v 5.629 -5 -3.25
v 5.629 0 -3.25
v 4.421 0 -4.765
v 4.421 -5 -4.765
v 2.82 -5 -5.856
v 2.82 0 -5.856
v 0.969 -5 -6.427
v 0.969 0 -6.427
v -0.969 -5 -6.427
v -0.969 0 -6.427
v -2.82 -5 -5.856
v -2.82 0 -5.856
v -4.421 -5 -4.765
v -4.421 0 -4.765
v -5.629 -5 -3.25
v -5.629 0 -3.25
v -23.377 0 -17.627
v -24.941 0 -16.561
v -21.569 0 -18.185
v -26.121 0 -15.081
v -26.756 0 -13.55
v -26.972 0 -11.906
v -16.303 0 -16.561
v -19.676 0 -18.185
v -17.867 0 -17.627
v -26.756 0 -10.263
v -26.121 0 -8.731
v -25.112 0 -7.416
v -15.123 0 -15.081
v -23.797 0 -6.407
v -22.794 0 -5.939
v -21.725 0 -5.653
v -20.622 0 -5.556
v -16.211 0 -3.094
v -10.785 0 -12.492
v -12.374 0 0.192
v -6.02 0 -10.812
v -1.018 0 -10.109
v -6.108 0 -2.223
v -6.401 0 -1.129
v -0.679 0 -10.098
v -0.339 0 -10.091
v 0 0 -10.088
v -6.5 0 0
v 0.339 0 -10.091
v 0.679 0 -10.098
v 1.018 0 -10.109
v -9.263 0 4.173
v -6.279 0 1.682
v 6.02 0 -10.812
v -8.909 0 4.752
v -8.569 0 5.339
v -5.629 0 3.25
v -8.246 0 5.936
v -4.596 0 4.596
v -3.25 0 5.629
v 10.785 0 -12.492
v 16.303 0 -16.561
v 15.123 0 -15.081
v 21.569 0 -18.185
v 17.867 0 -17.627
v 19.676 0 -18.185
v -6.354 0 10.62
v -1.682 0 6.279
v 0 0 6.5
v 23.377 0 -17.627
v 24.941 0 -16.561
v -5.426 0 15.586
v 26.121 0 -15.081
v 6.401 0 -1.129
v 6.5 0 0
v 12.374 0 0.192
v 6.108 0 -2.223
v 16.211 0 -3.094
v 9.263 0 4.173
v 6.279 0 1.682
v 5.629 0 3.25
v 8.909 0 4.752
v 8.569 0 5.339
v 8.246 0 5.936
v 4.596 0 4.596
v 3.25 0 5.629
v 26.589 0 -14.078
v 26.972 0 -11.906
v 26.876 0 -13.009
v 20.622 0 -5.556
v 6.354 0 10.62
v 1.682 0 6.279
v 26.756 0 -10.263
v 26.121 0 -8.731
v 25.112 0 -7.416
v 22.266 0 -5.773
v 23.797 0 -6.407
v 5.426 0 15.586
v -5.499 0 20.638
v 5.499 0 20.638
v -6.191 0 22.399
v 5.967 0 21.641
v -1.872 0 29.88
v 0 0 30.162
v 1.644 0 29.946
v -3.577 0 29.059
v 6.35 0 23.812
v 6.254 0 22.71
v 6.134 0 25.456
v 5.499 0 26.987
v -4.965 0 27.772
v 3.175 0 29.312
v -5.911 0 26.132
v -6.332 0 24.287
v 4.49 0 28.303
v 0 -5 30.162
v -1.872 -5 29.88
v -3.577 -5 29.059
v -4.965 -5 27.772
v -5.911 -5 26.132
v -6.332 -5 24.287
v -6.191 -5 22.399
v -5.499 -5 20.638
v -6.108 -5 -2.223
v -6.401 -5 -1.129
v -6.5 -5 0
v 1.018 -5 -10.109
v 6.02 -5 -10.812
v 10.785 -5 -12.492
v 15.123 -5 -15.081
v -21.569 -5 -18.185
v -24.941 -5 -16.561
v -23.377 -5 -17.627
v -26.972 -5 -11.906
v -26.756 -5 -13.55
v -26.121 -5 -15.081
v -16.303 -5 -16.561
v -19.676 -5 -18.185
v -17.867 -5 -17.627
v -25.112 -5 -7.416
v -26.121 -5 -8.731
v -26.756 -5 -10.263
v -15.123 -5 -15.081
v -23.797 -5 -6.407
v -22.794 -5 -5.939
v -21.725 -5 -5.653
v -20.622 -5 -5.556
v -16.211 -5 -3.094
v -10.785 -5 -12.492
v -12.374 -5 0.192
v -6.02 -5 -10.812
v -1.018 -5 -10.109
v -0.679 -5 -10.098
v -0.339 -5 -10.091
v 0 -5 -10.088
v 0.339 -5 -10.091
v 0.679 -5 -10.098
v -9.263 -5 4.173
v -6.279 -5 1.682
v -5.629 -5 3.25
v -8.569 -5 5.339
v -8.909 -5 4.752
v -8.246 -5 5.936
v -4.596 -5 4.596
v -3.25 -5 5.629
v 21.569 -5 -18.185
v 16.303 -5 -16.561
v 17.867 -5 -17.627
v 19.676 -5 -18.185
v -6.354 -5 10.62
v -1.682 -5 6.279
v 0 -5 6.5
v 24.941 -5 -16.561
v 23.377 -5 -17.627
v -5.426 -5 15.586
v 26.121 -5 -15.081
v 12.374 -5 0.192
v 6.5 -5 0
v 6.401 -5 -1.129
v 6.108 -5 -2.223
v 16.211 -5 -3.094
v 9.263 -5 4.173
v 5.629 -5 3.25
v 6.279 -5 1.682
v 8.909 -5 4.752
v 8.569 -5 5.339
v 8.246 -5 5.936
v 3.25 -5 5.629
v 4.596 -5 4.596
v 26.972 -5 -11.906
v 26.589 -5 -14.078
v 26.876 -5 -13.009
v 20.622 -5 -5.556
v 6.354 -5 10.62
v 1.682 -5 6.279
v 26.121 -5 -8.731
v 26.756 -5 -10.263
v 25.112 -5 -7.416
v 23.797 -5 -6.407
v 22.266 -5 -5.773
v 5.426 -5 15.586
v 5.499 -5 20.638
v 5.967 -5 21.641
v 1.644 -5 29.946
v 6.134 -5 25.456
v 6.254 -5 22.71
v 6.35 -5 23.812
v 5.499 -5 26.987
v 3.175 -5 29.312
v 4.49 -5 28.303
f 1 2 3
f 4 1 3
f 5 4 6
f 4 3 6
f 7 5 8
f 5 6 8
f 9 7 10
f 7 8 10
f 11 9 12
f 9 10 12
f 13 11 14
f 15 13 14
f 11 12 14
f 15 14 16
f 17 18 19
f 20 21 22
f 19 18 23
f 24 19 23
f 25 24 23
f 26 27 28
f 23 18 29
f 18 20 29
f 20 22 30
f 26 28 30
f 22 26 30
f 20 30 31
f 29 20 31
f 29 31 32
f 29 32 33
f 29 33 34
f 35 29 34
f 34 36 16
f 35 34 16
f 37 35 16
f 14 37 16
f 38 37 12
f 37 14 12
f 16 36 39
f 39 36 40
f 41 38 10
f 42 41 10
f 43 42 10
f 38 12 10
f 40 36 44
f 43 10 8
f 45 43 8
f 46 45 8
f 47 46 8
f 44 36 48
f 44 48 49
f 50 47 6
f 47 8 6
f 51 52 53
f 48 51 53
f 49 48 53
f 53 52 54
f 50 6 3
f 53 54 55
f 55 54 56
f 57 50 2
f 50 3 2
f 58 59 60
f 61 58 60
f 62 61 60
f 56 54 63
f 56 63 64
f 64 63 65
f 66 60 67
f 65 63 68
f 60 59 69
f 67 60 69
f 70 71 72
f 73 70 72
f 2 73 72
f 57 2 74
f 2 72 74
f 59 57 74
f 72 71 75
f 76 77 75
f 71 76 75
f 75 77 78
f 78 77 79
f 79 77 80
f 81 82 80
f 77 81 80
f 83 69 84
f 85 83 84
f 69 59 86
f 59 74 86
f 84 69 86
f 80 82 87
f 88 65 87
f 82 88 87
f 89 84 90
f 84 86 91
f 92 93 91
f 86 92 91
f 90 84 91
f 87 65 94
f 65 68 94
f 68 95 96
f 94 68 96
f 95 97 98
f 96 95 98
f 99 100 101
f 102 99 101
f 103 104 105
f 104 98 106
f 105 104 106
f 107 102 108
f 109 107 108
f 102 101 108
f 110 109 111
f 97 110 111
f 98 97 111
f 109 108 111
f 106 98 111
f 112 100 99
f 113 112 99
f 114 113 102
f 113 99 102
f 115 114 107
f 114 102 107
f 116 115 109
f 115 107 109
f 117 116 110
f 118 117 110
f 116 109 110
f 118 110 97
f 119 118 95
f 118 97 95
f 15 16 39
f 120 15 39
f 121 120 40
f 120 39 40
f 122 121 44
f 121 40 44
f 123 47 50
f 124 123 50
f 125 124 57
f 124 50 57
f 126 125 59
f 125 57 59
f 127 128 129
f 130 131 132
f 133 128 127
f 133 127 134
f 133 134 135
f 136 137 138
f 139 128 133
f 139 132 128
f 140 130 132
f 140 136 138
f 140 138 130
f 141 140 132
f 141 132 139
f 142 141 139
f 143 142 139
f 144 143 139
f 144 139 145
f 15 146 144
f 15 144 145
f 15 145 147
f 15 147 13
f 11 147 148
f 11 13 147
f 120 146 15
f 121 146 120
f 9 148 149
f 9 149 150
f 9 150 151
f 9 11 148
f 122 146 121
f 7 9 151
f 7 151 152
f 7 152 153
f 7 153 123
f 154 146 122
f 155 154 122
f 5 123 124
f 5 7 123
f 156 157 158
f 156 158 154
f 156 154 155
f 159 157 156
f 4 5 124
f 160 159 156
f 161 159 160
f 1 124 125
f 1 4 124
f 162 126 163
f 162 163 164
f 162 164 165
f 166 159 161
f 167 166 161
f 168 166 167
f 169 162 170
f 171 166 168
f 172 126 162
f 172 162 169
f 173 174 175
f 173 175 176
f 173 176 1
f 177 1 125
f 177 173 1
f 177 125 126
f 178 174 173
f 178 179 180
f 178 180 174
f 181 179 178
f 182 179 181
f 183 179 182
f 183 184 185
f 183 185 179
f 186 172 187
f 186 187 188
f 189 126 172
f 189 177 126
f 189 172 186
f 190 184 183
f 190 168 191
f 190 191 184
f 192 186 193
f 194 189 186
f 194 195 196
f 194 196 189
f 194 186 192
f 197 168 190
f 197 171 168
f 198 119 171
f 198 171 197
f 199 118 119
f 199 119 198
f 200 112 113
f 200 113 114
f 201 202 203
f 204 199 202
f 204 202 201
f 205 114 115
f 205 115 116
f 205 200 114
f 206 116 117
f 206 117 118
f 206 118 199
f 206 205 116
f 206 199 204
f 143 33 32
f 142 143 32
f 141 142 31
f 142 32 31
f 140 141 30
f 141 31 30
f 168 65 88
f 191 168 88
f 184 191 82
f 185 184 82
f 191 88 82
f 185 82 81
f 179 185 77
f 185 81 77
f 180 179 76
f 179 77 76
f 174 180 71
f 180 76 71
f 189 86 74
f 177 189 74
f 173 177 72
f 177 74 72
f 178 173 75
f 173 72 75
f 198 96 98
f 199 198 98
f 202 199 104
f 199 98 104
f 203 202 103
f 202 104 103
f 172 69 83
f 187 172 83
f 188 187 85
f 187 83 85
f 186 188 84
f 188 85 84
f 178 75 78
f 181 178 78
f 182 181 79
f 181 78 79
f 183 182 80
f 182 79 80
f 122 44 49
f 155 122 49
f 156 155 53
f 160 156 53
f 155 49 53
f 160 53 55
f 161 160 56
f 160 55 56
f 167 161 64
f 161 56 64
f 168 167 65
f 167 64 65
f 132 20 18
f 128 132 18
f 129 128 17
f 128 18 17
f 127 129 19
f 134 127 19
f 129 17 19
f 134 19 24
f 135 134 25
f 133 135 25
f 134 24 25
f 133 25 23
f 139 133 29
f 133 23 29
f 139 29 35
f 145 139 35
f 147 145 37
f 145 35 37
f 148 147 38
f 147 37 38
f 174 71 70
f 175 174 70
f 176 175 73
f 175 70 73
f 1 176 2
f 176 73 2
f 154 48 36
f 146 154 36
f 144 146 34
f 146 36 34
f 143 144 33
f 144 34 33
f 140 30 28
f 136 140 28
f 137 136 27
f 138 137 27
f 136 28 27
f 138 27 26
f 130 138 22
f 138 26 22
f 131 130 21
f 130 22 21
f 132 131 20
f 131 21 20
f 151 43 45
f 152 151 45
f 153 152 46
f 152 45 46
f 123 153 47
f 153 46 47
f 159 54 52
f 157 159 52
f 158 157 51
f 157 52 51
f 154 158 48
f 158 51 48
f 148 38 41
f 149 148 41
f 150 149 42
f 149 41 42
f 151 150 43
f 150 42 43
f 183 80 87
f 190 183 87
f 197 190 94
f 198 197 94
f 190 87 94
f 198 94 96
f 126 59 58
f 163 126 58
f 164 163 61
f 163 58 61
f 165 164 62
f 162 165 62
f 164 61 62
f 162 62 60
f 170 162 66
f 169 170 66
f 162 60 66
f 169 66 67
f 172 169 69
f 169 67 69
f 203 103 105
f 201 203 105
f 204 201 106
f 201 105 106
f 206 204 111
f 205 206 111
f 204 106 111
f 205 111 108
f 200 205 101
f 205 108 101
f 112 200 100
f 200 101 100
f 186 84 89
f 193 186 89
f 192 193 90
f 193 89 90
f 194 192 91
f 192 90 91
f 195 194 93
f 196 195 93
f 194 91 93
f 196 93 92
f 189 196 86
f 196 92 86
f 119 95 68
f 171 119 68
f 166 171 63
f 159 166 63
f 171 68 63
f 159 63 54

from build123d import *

# Parameters (mm, degrees)
F1_DEPTH = 5


# Not quite as in the source:
# - a feature names something its author has since deleted; it is built from what else it names


with BuildPart() as f1:
    # F0 (on Front) → F1 (new body)
    with BuildSketch(Plane.XZ):
        with BuildLine():
            ThreePointArc((-6.5, 0), (-4.5961940777, 4.5961940777), (0, 6.5))
            Line((0, 6.5), (0, 10.16))
            ThreePointArc((0, 10.16), (-4.6323577324, 9.0425030738), (-8.2456907547, 5.9358389447))
            ThreePointArc((-8.2456907547, 5.9358389447), (-8.7368966018, 5.0442496049), (-9.2634326962, 4.173058193))
            ThreePointArc((-9.2634326962, 4.173058193), (-9.9333296581, 2.1341419594), (-10.16, 0))
            Line((-10.16, 0), (-6.5, 0))
        make_face()
        with BuildLine():
            ThreePointArc((-5.6291651246, -3.25), (-6.2785178709, -1.6823237932), (-6.5, 0))
            Line((-6.5, 0), (-10.16, 0))
            ThreePointArc((-10.16, 0), (-9.8138063951, -2.6296014982), (-8.7988181024, -5.08))
            Line((-8.7988181024, -5.08), (-5.6291651246, -3.25))
        make_face()
        with BuildLine():
            ThreePointArc((-1.0177419415, -10.1088971377), (-0.508973166, -10.0935992038), (0, -10.0884992098))
            Line((0, -10.0884992098), (0, -6.5))
            ThreePointArc((0, -6.5), (-3.25, -5.6291651246), (-5.6291651246, -3.25))
            Line((-5.6291651246, -3.25), (-8.7988181024, -5.08))
            ThreePointArc((-8.7988181024, -5.08), (-5.5148585095, -8.5329910126), (-1.0177419415, -10.1088971377))
        make_face()
        with BuildLine():
            ThreePointArc((1.0177419415, -10.1088971377), (5.5148585095, -8.5329910126), (8.7988181024, -5.08))
            Line((8.7988181024, -5.08), (5.6291651246, -3.25))
            ThreePointArc((5.6291651246, -3.25), (3.25, -5.6291651246), (0, -6.5))
            Line((0, -6.5), (0, -10.0884992098))
            ThreePointArc((0, -10.0884992098), (0.508973166, -10.0935992038), (1.0177419415, -10.1088971377))
        make_face()
        with BuildLine():
            ThreePointArc((8.7988181024, -5.08), (9.8138063951, -2.6296014982), (10.16, 0))
            Line((10.16, 0), (6.5, 0))
            ThreePointArc((6.5, 0), (6.2785178709, -1.6823237932), (5.6291651246, -3.25))
            Line((5.6291651246, -3.25), (8.7988181024, -5.08))
        make_face()
        with BuildLine():
            Line((6.5, 0), (10.16, 0))
            ThreePointArc((10.16, 0), (9.9333296581, 2.1341419594), (9.2634326962, 4.173058193))
            ThreePointArc((9.2634326962, 4.173058193), (8.7368966018, 5.0442496049), (8.2456907547, 5.9358389447))
            ThreePointArc((8.2456907547, 5.9358389447), (4.6323577324, 9.0425030738), (0, 10.16))
            Line((0, 10.16), (0, 6.5))
            ThreePointArc((0, 6.5), (4.5961940777, 4.5961940777), (6.5, 0))
        make_face()
        with BuildLine():
            ThreePointArc((-8.2456907547, 5.9358389447), (-4.6323577324, 9.0425030738), (0, 10.16))
            Line((0, 10.16), (0, 15.875))
            Line((0, 15.875), (0, 17.4625))
            ThreePointArc((0, 17.4625), (-3.175, 18.313238686), (-5.499261314, 20.6375))
            ThreePointArc((-5.499261314, 20.6375), (-5.7658770412, 13.0799448007), (-8.2456907547, 5.9358389447))
        make_face()
        with BuildLine():
            Line((-5.499261314, 20.6375), (0, 23.8125))
            Line((0, 23.8125), (0, 30.1625))
            ThreePointArc((0, 30.1625), (-5.499261314, 26.9875), (-5.499261314, 20.6375))
        make_face()
        with BuildLine():
            Line((0, 23.8125), (5.499261314, 20.6375))
            ThreePointArc((5.499261314, 20.6375), (6.1336289969, 22.1689990636), (6.35, 23.8125))
            ThreePointArc((6.35, 23.8125), (4.4901280605, 28.3026280605), (0, 30.1625))
            Line((0, 30.1625), (0, 23.8125))
        make_face()
        with BuildLine():
            ThreePointArc((0, 17.4625), (3.175, 18.313238686), (5.499261314, 20.6375))
            Line((5.499261314, 20.6375), (0, 23.8125))
            Line((0, 23.8125), (0, 17.4625))
        make_face()
        with BuildLine():
            ThreePointArc((-5.499261314, 20.6375), (-3.175, 18.313238686), (0, 17.4625))
            Line((0, 17.4625), (0, 23.8125))
            Line((0, 23.8125), (-5.499261314, 20.6375))
        make_face()
        with BuildLine():
            Line((-20.6222299276, -5.55625), (-20.6222299276, -11.90625))
            Line((-20.6222299276, -11.90625), (-15.1229686136, -8.73125))
            ThreePointArc((-15.1229686136, -8.73125), (-17.4472299276, -6.406988686), (-20.6222299276, -5.55625))
        make_face()
        with BuildLine():
            Line((-23.7972299276, -6.406988686), (-20.6222299276, -11.90625))
            Line((-20.6222299276, -11.90625), (-20.6222299276, -5.55625))
            ThreePointArc((-20.6222299276, -5.55625), (-22.265730864, -5.7726210031), (-23.7972299276, -6.406988686))
        make_face()
        with BuildLine():
            ThreePointArc((-23.7972299276, -6.406988686), (-26.7558589246, -10.2627490636), (-26.1214912416, -15.08125))
            Line((-26.1214912416, -15.08125), (-20.6222299276, -11.90625))
            Line((-20.6222299276, -11.90625), (-23.7972299276, -6.406988686))
        make_face()
        with BuildLine():
            ThreePointArc((-26.1214912416, -15.08125), (-20.6222299276, -18.25625), (-15.1229686136, -15.08125))
            Line((-15.1229686136, -15.08125), (-20.6222299276, -11.90625))
            Line((-20.6222299276, -11.90625), (-26.1214912416, -15.08125))
        make_face()
        with BuildLine():
            Line((-20.6222299276, -11.90625), (-15.1229686136, -15.08125))
            ThreePointArc((-15.1229686136, -15.08125), (-14.4886009307, -13.5497509364), (-14.2722299276, -11.90625))
            ThreePointArc((-14.2722299276, -11.90625), (-14.4886009307, -10.2627490636), (-15.1229686136, -8.73125))
            Line((-15.1229686136, -8.73125), (-20.6222299276, -11.90625))
        make_face()
        with BuildLine():
            Line((20.6222299276, -11.90625), (15.1229686136, -15.08125))
            ThreePointArc((15.1229686136, -15.08125), (20.6222299276, -18.25625), (26.1214912416, -15.08125))
            Line((26.1214912416, -15.08125), (20.6222299276, -11.90625))
        make_face()
        with BuildLine():
            ThreePointArc((26.9722299276, -11.90625), (25.1123579882, -7.4161219395), (20.6222299276, -5.55625))
            Line((20.6222299276, -5.55625), (20.6222299276, -11.90625))
            Line((20.6222299276, -11.90625), (26.1214912416, -15.08125))
            ThreePointArc((26.1214912416, -15.08125), (26.7558589246, -13.5497509364), (26.9722299276, -11.90625))
        make_face()
        with BuildLine():
            Line((20.6222299276, -11.90625), (20.6222299276, -5.55625))
            ThreePointArc((20.6222299276, -5.55625), (17.4472299276, -6.406988686), (15.1229686136, -8.73125))
            Line((15.1229686136, -8.73125), (20.6222299276, -11.90625))
        make_face()
        with BuildLine():
            ThreePointArc((15.1229686136, -8.73125), (14.2722299276, -11.90625), (15.1229686136, -15.08125))
            Line((15.1229686136, -15.08125), (20.6222299276, -11.90625))
            Line((20.6222299276, -11.90625), (15.1229686136, -8.73125))
        make_face()
        with BuildLine():
            ThreePointArc((-15.1229686136, -15.08125), (-8.4446259569, -11.5333683931), (-1.0177419415, -10.1088971377))
            ThreePointArc((-1.0177419415, -10.1088971377), (-5.5148585095, -8.5329910126), (-8.7988181024, -5.08))
            Line((-8.7988181024, -5.08), (-13.7481532851, -7.9375))
            Line((-13.7481532851, -7.9375), (-15.1229686136, -8.73125))
            ThreePointArc((-15.1229686136, -8.73125), (-14.4886009307, -10.2627490636), (-14.2722299276, -11.90625))
            ThreePointArc((-14.2722299276, -11.90625), (-14.4886009307, -13.5497509364), (-15.1229686136, -15.08125))
        make_face()
        with BuildLine():
            ThreePointArc((0, 10.16), (4.6323577324, 9.0425030738), (8.2456907547, 5.9358389447))
            ThreePointArc((8.2456907547, 5.9358389447), (5.7658770412, 13.0799448007), (5.499261314, 20.6375))
            ThreePointArc((5.499261314, 20.6375), (3.175, 18.313238686), (0, 17.4625))
            Line((0, 17.4625), (0, 15.875))
            Line((0, 15.875), (0, 10.16))
        make_face()
        with BuildLine():
            Line((12.5597401985, 0), (10.16, 0))
            ThreePointArc((10.16, 0), (9.8138063951, -2.6296014982), (8.7988181024, -5.08))
            Line((8.7988181024, -5.08), (13.7481532851, -7.9375))
            Line((13.7481532851, -7.9375), (15.1229686136, -8.73125))
            ThreePointArc((15.1229686136, -8.73125), (17.4472299276, -6.406988686), (20.6222299276, -5.55625))
            ThreePointArc((20.6222299276, -5.55625), (16.3207116364, -3.1703097876), (12.5597401985, 0))
        make_face()
        with BuildLine():
            ThreePointArc((-8.7988181024, -5.08), (-9.8138063951, -2.6296014982), (-10.16, 0))
            Line((-10.16, 0), (-12.5597401985, 0))
            ThreePointArc((-12.5597401985, 0), (-16.3207116364, -3.1703097876), (-20.6222299276, -5.55625))
            ThreePointArc((-20.6222299276, -5.55625), (-17.4472299276, -6.406988686), (-15.1229686136, -8.73125))
            Line((-15.1229686136, -8.73125), (-13.7481532851, -7.9375))
            Line((-13.7481532851, -7.9375), (-8.7988181024, -5.08))
        make_face()
        with BuildLine():
            Line((13.7481532851, -7.9375), (8.7988181024, -5.08))
            ThreePointArc((8.7988181024, -5.08), (5.5148585095, -8.5329910126), (1.0177419415, -10.1088971377))
            ThreePointArc((1.0177419415, -10.1088971377), (8.4446259569, -11.5333683931), (15.1229686136, -15.08125))
            ThreePointArc((15.1229686136, -15.08125), (14.2722299276, -11.90625), (15.1229686136, -8.73125))
            Line((15.1229686136, -8.73125), (13.7481532851, -7.9375))
        make_face()
        with BuildLine():
            Line((-12.5597401985, 0), (-10.16, 0))
            ThreePointArc((-10.16, 0), (-9.9333296581, 2.1341419594), (-9.2634326962, 4.173058193))
            ThreePointArc((-9.2634326962, 4.173058193), (-10.8020734635, 2.0000245587), (-12.5597401985, 0))
        make_face()
        with BuildLine():
            ThreePointArc((9.2634326962, 4.173058193), (9.9333296581, 2.1341419594), (10.16, 0))
            Line((10.16, 0), (12.5597401985, 0))
            ThreePointArc((12.5597401985, 0), (10.8020734635, 2.0000245587), (9.2634326962, 4.173058193))
        make_face()
    extrude(amount=F1_DEPTH)


solid = f1.part
